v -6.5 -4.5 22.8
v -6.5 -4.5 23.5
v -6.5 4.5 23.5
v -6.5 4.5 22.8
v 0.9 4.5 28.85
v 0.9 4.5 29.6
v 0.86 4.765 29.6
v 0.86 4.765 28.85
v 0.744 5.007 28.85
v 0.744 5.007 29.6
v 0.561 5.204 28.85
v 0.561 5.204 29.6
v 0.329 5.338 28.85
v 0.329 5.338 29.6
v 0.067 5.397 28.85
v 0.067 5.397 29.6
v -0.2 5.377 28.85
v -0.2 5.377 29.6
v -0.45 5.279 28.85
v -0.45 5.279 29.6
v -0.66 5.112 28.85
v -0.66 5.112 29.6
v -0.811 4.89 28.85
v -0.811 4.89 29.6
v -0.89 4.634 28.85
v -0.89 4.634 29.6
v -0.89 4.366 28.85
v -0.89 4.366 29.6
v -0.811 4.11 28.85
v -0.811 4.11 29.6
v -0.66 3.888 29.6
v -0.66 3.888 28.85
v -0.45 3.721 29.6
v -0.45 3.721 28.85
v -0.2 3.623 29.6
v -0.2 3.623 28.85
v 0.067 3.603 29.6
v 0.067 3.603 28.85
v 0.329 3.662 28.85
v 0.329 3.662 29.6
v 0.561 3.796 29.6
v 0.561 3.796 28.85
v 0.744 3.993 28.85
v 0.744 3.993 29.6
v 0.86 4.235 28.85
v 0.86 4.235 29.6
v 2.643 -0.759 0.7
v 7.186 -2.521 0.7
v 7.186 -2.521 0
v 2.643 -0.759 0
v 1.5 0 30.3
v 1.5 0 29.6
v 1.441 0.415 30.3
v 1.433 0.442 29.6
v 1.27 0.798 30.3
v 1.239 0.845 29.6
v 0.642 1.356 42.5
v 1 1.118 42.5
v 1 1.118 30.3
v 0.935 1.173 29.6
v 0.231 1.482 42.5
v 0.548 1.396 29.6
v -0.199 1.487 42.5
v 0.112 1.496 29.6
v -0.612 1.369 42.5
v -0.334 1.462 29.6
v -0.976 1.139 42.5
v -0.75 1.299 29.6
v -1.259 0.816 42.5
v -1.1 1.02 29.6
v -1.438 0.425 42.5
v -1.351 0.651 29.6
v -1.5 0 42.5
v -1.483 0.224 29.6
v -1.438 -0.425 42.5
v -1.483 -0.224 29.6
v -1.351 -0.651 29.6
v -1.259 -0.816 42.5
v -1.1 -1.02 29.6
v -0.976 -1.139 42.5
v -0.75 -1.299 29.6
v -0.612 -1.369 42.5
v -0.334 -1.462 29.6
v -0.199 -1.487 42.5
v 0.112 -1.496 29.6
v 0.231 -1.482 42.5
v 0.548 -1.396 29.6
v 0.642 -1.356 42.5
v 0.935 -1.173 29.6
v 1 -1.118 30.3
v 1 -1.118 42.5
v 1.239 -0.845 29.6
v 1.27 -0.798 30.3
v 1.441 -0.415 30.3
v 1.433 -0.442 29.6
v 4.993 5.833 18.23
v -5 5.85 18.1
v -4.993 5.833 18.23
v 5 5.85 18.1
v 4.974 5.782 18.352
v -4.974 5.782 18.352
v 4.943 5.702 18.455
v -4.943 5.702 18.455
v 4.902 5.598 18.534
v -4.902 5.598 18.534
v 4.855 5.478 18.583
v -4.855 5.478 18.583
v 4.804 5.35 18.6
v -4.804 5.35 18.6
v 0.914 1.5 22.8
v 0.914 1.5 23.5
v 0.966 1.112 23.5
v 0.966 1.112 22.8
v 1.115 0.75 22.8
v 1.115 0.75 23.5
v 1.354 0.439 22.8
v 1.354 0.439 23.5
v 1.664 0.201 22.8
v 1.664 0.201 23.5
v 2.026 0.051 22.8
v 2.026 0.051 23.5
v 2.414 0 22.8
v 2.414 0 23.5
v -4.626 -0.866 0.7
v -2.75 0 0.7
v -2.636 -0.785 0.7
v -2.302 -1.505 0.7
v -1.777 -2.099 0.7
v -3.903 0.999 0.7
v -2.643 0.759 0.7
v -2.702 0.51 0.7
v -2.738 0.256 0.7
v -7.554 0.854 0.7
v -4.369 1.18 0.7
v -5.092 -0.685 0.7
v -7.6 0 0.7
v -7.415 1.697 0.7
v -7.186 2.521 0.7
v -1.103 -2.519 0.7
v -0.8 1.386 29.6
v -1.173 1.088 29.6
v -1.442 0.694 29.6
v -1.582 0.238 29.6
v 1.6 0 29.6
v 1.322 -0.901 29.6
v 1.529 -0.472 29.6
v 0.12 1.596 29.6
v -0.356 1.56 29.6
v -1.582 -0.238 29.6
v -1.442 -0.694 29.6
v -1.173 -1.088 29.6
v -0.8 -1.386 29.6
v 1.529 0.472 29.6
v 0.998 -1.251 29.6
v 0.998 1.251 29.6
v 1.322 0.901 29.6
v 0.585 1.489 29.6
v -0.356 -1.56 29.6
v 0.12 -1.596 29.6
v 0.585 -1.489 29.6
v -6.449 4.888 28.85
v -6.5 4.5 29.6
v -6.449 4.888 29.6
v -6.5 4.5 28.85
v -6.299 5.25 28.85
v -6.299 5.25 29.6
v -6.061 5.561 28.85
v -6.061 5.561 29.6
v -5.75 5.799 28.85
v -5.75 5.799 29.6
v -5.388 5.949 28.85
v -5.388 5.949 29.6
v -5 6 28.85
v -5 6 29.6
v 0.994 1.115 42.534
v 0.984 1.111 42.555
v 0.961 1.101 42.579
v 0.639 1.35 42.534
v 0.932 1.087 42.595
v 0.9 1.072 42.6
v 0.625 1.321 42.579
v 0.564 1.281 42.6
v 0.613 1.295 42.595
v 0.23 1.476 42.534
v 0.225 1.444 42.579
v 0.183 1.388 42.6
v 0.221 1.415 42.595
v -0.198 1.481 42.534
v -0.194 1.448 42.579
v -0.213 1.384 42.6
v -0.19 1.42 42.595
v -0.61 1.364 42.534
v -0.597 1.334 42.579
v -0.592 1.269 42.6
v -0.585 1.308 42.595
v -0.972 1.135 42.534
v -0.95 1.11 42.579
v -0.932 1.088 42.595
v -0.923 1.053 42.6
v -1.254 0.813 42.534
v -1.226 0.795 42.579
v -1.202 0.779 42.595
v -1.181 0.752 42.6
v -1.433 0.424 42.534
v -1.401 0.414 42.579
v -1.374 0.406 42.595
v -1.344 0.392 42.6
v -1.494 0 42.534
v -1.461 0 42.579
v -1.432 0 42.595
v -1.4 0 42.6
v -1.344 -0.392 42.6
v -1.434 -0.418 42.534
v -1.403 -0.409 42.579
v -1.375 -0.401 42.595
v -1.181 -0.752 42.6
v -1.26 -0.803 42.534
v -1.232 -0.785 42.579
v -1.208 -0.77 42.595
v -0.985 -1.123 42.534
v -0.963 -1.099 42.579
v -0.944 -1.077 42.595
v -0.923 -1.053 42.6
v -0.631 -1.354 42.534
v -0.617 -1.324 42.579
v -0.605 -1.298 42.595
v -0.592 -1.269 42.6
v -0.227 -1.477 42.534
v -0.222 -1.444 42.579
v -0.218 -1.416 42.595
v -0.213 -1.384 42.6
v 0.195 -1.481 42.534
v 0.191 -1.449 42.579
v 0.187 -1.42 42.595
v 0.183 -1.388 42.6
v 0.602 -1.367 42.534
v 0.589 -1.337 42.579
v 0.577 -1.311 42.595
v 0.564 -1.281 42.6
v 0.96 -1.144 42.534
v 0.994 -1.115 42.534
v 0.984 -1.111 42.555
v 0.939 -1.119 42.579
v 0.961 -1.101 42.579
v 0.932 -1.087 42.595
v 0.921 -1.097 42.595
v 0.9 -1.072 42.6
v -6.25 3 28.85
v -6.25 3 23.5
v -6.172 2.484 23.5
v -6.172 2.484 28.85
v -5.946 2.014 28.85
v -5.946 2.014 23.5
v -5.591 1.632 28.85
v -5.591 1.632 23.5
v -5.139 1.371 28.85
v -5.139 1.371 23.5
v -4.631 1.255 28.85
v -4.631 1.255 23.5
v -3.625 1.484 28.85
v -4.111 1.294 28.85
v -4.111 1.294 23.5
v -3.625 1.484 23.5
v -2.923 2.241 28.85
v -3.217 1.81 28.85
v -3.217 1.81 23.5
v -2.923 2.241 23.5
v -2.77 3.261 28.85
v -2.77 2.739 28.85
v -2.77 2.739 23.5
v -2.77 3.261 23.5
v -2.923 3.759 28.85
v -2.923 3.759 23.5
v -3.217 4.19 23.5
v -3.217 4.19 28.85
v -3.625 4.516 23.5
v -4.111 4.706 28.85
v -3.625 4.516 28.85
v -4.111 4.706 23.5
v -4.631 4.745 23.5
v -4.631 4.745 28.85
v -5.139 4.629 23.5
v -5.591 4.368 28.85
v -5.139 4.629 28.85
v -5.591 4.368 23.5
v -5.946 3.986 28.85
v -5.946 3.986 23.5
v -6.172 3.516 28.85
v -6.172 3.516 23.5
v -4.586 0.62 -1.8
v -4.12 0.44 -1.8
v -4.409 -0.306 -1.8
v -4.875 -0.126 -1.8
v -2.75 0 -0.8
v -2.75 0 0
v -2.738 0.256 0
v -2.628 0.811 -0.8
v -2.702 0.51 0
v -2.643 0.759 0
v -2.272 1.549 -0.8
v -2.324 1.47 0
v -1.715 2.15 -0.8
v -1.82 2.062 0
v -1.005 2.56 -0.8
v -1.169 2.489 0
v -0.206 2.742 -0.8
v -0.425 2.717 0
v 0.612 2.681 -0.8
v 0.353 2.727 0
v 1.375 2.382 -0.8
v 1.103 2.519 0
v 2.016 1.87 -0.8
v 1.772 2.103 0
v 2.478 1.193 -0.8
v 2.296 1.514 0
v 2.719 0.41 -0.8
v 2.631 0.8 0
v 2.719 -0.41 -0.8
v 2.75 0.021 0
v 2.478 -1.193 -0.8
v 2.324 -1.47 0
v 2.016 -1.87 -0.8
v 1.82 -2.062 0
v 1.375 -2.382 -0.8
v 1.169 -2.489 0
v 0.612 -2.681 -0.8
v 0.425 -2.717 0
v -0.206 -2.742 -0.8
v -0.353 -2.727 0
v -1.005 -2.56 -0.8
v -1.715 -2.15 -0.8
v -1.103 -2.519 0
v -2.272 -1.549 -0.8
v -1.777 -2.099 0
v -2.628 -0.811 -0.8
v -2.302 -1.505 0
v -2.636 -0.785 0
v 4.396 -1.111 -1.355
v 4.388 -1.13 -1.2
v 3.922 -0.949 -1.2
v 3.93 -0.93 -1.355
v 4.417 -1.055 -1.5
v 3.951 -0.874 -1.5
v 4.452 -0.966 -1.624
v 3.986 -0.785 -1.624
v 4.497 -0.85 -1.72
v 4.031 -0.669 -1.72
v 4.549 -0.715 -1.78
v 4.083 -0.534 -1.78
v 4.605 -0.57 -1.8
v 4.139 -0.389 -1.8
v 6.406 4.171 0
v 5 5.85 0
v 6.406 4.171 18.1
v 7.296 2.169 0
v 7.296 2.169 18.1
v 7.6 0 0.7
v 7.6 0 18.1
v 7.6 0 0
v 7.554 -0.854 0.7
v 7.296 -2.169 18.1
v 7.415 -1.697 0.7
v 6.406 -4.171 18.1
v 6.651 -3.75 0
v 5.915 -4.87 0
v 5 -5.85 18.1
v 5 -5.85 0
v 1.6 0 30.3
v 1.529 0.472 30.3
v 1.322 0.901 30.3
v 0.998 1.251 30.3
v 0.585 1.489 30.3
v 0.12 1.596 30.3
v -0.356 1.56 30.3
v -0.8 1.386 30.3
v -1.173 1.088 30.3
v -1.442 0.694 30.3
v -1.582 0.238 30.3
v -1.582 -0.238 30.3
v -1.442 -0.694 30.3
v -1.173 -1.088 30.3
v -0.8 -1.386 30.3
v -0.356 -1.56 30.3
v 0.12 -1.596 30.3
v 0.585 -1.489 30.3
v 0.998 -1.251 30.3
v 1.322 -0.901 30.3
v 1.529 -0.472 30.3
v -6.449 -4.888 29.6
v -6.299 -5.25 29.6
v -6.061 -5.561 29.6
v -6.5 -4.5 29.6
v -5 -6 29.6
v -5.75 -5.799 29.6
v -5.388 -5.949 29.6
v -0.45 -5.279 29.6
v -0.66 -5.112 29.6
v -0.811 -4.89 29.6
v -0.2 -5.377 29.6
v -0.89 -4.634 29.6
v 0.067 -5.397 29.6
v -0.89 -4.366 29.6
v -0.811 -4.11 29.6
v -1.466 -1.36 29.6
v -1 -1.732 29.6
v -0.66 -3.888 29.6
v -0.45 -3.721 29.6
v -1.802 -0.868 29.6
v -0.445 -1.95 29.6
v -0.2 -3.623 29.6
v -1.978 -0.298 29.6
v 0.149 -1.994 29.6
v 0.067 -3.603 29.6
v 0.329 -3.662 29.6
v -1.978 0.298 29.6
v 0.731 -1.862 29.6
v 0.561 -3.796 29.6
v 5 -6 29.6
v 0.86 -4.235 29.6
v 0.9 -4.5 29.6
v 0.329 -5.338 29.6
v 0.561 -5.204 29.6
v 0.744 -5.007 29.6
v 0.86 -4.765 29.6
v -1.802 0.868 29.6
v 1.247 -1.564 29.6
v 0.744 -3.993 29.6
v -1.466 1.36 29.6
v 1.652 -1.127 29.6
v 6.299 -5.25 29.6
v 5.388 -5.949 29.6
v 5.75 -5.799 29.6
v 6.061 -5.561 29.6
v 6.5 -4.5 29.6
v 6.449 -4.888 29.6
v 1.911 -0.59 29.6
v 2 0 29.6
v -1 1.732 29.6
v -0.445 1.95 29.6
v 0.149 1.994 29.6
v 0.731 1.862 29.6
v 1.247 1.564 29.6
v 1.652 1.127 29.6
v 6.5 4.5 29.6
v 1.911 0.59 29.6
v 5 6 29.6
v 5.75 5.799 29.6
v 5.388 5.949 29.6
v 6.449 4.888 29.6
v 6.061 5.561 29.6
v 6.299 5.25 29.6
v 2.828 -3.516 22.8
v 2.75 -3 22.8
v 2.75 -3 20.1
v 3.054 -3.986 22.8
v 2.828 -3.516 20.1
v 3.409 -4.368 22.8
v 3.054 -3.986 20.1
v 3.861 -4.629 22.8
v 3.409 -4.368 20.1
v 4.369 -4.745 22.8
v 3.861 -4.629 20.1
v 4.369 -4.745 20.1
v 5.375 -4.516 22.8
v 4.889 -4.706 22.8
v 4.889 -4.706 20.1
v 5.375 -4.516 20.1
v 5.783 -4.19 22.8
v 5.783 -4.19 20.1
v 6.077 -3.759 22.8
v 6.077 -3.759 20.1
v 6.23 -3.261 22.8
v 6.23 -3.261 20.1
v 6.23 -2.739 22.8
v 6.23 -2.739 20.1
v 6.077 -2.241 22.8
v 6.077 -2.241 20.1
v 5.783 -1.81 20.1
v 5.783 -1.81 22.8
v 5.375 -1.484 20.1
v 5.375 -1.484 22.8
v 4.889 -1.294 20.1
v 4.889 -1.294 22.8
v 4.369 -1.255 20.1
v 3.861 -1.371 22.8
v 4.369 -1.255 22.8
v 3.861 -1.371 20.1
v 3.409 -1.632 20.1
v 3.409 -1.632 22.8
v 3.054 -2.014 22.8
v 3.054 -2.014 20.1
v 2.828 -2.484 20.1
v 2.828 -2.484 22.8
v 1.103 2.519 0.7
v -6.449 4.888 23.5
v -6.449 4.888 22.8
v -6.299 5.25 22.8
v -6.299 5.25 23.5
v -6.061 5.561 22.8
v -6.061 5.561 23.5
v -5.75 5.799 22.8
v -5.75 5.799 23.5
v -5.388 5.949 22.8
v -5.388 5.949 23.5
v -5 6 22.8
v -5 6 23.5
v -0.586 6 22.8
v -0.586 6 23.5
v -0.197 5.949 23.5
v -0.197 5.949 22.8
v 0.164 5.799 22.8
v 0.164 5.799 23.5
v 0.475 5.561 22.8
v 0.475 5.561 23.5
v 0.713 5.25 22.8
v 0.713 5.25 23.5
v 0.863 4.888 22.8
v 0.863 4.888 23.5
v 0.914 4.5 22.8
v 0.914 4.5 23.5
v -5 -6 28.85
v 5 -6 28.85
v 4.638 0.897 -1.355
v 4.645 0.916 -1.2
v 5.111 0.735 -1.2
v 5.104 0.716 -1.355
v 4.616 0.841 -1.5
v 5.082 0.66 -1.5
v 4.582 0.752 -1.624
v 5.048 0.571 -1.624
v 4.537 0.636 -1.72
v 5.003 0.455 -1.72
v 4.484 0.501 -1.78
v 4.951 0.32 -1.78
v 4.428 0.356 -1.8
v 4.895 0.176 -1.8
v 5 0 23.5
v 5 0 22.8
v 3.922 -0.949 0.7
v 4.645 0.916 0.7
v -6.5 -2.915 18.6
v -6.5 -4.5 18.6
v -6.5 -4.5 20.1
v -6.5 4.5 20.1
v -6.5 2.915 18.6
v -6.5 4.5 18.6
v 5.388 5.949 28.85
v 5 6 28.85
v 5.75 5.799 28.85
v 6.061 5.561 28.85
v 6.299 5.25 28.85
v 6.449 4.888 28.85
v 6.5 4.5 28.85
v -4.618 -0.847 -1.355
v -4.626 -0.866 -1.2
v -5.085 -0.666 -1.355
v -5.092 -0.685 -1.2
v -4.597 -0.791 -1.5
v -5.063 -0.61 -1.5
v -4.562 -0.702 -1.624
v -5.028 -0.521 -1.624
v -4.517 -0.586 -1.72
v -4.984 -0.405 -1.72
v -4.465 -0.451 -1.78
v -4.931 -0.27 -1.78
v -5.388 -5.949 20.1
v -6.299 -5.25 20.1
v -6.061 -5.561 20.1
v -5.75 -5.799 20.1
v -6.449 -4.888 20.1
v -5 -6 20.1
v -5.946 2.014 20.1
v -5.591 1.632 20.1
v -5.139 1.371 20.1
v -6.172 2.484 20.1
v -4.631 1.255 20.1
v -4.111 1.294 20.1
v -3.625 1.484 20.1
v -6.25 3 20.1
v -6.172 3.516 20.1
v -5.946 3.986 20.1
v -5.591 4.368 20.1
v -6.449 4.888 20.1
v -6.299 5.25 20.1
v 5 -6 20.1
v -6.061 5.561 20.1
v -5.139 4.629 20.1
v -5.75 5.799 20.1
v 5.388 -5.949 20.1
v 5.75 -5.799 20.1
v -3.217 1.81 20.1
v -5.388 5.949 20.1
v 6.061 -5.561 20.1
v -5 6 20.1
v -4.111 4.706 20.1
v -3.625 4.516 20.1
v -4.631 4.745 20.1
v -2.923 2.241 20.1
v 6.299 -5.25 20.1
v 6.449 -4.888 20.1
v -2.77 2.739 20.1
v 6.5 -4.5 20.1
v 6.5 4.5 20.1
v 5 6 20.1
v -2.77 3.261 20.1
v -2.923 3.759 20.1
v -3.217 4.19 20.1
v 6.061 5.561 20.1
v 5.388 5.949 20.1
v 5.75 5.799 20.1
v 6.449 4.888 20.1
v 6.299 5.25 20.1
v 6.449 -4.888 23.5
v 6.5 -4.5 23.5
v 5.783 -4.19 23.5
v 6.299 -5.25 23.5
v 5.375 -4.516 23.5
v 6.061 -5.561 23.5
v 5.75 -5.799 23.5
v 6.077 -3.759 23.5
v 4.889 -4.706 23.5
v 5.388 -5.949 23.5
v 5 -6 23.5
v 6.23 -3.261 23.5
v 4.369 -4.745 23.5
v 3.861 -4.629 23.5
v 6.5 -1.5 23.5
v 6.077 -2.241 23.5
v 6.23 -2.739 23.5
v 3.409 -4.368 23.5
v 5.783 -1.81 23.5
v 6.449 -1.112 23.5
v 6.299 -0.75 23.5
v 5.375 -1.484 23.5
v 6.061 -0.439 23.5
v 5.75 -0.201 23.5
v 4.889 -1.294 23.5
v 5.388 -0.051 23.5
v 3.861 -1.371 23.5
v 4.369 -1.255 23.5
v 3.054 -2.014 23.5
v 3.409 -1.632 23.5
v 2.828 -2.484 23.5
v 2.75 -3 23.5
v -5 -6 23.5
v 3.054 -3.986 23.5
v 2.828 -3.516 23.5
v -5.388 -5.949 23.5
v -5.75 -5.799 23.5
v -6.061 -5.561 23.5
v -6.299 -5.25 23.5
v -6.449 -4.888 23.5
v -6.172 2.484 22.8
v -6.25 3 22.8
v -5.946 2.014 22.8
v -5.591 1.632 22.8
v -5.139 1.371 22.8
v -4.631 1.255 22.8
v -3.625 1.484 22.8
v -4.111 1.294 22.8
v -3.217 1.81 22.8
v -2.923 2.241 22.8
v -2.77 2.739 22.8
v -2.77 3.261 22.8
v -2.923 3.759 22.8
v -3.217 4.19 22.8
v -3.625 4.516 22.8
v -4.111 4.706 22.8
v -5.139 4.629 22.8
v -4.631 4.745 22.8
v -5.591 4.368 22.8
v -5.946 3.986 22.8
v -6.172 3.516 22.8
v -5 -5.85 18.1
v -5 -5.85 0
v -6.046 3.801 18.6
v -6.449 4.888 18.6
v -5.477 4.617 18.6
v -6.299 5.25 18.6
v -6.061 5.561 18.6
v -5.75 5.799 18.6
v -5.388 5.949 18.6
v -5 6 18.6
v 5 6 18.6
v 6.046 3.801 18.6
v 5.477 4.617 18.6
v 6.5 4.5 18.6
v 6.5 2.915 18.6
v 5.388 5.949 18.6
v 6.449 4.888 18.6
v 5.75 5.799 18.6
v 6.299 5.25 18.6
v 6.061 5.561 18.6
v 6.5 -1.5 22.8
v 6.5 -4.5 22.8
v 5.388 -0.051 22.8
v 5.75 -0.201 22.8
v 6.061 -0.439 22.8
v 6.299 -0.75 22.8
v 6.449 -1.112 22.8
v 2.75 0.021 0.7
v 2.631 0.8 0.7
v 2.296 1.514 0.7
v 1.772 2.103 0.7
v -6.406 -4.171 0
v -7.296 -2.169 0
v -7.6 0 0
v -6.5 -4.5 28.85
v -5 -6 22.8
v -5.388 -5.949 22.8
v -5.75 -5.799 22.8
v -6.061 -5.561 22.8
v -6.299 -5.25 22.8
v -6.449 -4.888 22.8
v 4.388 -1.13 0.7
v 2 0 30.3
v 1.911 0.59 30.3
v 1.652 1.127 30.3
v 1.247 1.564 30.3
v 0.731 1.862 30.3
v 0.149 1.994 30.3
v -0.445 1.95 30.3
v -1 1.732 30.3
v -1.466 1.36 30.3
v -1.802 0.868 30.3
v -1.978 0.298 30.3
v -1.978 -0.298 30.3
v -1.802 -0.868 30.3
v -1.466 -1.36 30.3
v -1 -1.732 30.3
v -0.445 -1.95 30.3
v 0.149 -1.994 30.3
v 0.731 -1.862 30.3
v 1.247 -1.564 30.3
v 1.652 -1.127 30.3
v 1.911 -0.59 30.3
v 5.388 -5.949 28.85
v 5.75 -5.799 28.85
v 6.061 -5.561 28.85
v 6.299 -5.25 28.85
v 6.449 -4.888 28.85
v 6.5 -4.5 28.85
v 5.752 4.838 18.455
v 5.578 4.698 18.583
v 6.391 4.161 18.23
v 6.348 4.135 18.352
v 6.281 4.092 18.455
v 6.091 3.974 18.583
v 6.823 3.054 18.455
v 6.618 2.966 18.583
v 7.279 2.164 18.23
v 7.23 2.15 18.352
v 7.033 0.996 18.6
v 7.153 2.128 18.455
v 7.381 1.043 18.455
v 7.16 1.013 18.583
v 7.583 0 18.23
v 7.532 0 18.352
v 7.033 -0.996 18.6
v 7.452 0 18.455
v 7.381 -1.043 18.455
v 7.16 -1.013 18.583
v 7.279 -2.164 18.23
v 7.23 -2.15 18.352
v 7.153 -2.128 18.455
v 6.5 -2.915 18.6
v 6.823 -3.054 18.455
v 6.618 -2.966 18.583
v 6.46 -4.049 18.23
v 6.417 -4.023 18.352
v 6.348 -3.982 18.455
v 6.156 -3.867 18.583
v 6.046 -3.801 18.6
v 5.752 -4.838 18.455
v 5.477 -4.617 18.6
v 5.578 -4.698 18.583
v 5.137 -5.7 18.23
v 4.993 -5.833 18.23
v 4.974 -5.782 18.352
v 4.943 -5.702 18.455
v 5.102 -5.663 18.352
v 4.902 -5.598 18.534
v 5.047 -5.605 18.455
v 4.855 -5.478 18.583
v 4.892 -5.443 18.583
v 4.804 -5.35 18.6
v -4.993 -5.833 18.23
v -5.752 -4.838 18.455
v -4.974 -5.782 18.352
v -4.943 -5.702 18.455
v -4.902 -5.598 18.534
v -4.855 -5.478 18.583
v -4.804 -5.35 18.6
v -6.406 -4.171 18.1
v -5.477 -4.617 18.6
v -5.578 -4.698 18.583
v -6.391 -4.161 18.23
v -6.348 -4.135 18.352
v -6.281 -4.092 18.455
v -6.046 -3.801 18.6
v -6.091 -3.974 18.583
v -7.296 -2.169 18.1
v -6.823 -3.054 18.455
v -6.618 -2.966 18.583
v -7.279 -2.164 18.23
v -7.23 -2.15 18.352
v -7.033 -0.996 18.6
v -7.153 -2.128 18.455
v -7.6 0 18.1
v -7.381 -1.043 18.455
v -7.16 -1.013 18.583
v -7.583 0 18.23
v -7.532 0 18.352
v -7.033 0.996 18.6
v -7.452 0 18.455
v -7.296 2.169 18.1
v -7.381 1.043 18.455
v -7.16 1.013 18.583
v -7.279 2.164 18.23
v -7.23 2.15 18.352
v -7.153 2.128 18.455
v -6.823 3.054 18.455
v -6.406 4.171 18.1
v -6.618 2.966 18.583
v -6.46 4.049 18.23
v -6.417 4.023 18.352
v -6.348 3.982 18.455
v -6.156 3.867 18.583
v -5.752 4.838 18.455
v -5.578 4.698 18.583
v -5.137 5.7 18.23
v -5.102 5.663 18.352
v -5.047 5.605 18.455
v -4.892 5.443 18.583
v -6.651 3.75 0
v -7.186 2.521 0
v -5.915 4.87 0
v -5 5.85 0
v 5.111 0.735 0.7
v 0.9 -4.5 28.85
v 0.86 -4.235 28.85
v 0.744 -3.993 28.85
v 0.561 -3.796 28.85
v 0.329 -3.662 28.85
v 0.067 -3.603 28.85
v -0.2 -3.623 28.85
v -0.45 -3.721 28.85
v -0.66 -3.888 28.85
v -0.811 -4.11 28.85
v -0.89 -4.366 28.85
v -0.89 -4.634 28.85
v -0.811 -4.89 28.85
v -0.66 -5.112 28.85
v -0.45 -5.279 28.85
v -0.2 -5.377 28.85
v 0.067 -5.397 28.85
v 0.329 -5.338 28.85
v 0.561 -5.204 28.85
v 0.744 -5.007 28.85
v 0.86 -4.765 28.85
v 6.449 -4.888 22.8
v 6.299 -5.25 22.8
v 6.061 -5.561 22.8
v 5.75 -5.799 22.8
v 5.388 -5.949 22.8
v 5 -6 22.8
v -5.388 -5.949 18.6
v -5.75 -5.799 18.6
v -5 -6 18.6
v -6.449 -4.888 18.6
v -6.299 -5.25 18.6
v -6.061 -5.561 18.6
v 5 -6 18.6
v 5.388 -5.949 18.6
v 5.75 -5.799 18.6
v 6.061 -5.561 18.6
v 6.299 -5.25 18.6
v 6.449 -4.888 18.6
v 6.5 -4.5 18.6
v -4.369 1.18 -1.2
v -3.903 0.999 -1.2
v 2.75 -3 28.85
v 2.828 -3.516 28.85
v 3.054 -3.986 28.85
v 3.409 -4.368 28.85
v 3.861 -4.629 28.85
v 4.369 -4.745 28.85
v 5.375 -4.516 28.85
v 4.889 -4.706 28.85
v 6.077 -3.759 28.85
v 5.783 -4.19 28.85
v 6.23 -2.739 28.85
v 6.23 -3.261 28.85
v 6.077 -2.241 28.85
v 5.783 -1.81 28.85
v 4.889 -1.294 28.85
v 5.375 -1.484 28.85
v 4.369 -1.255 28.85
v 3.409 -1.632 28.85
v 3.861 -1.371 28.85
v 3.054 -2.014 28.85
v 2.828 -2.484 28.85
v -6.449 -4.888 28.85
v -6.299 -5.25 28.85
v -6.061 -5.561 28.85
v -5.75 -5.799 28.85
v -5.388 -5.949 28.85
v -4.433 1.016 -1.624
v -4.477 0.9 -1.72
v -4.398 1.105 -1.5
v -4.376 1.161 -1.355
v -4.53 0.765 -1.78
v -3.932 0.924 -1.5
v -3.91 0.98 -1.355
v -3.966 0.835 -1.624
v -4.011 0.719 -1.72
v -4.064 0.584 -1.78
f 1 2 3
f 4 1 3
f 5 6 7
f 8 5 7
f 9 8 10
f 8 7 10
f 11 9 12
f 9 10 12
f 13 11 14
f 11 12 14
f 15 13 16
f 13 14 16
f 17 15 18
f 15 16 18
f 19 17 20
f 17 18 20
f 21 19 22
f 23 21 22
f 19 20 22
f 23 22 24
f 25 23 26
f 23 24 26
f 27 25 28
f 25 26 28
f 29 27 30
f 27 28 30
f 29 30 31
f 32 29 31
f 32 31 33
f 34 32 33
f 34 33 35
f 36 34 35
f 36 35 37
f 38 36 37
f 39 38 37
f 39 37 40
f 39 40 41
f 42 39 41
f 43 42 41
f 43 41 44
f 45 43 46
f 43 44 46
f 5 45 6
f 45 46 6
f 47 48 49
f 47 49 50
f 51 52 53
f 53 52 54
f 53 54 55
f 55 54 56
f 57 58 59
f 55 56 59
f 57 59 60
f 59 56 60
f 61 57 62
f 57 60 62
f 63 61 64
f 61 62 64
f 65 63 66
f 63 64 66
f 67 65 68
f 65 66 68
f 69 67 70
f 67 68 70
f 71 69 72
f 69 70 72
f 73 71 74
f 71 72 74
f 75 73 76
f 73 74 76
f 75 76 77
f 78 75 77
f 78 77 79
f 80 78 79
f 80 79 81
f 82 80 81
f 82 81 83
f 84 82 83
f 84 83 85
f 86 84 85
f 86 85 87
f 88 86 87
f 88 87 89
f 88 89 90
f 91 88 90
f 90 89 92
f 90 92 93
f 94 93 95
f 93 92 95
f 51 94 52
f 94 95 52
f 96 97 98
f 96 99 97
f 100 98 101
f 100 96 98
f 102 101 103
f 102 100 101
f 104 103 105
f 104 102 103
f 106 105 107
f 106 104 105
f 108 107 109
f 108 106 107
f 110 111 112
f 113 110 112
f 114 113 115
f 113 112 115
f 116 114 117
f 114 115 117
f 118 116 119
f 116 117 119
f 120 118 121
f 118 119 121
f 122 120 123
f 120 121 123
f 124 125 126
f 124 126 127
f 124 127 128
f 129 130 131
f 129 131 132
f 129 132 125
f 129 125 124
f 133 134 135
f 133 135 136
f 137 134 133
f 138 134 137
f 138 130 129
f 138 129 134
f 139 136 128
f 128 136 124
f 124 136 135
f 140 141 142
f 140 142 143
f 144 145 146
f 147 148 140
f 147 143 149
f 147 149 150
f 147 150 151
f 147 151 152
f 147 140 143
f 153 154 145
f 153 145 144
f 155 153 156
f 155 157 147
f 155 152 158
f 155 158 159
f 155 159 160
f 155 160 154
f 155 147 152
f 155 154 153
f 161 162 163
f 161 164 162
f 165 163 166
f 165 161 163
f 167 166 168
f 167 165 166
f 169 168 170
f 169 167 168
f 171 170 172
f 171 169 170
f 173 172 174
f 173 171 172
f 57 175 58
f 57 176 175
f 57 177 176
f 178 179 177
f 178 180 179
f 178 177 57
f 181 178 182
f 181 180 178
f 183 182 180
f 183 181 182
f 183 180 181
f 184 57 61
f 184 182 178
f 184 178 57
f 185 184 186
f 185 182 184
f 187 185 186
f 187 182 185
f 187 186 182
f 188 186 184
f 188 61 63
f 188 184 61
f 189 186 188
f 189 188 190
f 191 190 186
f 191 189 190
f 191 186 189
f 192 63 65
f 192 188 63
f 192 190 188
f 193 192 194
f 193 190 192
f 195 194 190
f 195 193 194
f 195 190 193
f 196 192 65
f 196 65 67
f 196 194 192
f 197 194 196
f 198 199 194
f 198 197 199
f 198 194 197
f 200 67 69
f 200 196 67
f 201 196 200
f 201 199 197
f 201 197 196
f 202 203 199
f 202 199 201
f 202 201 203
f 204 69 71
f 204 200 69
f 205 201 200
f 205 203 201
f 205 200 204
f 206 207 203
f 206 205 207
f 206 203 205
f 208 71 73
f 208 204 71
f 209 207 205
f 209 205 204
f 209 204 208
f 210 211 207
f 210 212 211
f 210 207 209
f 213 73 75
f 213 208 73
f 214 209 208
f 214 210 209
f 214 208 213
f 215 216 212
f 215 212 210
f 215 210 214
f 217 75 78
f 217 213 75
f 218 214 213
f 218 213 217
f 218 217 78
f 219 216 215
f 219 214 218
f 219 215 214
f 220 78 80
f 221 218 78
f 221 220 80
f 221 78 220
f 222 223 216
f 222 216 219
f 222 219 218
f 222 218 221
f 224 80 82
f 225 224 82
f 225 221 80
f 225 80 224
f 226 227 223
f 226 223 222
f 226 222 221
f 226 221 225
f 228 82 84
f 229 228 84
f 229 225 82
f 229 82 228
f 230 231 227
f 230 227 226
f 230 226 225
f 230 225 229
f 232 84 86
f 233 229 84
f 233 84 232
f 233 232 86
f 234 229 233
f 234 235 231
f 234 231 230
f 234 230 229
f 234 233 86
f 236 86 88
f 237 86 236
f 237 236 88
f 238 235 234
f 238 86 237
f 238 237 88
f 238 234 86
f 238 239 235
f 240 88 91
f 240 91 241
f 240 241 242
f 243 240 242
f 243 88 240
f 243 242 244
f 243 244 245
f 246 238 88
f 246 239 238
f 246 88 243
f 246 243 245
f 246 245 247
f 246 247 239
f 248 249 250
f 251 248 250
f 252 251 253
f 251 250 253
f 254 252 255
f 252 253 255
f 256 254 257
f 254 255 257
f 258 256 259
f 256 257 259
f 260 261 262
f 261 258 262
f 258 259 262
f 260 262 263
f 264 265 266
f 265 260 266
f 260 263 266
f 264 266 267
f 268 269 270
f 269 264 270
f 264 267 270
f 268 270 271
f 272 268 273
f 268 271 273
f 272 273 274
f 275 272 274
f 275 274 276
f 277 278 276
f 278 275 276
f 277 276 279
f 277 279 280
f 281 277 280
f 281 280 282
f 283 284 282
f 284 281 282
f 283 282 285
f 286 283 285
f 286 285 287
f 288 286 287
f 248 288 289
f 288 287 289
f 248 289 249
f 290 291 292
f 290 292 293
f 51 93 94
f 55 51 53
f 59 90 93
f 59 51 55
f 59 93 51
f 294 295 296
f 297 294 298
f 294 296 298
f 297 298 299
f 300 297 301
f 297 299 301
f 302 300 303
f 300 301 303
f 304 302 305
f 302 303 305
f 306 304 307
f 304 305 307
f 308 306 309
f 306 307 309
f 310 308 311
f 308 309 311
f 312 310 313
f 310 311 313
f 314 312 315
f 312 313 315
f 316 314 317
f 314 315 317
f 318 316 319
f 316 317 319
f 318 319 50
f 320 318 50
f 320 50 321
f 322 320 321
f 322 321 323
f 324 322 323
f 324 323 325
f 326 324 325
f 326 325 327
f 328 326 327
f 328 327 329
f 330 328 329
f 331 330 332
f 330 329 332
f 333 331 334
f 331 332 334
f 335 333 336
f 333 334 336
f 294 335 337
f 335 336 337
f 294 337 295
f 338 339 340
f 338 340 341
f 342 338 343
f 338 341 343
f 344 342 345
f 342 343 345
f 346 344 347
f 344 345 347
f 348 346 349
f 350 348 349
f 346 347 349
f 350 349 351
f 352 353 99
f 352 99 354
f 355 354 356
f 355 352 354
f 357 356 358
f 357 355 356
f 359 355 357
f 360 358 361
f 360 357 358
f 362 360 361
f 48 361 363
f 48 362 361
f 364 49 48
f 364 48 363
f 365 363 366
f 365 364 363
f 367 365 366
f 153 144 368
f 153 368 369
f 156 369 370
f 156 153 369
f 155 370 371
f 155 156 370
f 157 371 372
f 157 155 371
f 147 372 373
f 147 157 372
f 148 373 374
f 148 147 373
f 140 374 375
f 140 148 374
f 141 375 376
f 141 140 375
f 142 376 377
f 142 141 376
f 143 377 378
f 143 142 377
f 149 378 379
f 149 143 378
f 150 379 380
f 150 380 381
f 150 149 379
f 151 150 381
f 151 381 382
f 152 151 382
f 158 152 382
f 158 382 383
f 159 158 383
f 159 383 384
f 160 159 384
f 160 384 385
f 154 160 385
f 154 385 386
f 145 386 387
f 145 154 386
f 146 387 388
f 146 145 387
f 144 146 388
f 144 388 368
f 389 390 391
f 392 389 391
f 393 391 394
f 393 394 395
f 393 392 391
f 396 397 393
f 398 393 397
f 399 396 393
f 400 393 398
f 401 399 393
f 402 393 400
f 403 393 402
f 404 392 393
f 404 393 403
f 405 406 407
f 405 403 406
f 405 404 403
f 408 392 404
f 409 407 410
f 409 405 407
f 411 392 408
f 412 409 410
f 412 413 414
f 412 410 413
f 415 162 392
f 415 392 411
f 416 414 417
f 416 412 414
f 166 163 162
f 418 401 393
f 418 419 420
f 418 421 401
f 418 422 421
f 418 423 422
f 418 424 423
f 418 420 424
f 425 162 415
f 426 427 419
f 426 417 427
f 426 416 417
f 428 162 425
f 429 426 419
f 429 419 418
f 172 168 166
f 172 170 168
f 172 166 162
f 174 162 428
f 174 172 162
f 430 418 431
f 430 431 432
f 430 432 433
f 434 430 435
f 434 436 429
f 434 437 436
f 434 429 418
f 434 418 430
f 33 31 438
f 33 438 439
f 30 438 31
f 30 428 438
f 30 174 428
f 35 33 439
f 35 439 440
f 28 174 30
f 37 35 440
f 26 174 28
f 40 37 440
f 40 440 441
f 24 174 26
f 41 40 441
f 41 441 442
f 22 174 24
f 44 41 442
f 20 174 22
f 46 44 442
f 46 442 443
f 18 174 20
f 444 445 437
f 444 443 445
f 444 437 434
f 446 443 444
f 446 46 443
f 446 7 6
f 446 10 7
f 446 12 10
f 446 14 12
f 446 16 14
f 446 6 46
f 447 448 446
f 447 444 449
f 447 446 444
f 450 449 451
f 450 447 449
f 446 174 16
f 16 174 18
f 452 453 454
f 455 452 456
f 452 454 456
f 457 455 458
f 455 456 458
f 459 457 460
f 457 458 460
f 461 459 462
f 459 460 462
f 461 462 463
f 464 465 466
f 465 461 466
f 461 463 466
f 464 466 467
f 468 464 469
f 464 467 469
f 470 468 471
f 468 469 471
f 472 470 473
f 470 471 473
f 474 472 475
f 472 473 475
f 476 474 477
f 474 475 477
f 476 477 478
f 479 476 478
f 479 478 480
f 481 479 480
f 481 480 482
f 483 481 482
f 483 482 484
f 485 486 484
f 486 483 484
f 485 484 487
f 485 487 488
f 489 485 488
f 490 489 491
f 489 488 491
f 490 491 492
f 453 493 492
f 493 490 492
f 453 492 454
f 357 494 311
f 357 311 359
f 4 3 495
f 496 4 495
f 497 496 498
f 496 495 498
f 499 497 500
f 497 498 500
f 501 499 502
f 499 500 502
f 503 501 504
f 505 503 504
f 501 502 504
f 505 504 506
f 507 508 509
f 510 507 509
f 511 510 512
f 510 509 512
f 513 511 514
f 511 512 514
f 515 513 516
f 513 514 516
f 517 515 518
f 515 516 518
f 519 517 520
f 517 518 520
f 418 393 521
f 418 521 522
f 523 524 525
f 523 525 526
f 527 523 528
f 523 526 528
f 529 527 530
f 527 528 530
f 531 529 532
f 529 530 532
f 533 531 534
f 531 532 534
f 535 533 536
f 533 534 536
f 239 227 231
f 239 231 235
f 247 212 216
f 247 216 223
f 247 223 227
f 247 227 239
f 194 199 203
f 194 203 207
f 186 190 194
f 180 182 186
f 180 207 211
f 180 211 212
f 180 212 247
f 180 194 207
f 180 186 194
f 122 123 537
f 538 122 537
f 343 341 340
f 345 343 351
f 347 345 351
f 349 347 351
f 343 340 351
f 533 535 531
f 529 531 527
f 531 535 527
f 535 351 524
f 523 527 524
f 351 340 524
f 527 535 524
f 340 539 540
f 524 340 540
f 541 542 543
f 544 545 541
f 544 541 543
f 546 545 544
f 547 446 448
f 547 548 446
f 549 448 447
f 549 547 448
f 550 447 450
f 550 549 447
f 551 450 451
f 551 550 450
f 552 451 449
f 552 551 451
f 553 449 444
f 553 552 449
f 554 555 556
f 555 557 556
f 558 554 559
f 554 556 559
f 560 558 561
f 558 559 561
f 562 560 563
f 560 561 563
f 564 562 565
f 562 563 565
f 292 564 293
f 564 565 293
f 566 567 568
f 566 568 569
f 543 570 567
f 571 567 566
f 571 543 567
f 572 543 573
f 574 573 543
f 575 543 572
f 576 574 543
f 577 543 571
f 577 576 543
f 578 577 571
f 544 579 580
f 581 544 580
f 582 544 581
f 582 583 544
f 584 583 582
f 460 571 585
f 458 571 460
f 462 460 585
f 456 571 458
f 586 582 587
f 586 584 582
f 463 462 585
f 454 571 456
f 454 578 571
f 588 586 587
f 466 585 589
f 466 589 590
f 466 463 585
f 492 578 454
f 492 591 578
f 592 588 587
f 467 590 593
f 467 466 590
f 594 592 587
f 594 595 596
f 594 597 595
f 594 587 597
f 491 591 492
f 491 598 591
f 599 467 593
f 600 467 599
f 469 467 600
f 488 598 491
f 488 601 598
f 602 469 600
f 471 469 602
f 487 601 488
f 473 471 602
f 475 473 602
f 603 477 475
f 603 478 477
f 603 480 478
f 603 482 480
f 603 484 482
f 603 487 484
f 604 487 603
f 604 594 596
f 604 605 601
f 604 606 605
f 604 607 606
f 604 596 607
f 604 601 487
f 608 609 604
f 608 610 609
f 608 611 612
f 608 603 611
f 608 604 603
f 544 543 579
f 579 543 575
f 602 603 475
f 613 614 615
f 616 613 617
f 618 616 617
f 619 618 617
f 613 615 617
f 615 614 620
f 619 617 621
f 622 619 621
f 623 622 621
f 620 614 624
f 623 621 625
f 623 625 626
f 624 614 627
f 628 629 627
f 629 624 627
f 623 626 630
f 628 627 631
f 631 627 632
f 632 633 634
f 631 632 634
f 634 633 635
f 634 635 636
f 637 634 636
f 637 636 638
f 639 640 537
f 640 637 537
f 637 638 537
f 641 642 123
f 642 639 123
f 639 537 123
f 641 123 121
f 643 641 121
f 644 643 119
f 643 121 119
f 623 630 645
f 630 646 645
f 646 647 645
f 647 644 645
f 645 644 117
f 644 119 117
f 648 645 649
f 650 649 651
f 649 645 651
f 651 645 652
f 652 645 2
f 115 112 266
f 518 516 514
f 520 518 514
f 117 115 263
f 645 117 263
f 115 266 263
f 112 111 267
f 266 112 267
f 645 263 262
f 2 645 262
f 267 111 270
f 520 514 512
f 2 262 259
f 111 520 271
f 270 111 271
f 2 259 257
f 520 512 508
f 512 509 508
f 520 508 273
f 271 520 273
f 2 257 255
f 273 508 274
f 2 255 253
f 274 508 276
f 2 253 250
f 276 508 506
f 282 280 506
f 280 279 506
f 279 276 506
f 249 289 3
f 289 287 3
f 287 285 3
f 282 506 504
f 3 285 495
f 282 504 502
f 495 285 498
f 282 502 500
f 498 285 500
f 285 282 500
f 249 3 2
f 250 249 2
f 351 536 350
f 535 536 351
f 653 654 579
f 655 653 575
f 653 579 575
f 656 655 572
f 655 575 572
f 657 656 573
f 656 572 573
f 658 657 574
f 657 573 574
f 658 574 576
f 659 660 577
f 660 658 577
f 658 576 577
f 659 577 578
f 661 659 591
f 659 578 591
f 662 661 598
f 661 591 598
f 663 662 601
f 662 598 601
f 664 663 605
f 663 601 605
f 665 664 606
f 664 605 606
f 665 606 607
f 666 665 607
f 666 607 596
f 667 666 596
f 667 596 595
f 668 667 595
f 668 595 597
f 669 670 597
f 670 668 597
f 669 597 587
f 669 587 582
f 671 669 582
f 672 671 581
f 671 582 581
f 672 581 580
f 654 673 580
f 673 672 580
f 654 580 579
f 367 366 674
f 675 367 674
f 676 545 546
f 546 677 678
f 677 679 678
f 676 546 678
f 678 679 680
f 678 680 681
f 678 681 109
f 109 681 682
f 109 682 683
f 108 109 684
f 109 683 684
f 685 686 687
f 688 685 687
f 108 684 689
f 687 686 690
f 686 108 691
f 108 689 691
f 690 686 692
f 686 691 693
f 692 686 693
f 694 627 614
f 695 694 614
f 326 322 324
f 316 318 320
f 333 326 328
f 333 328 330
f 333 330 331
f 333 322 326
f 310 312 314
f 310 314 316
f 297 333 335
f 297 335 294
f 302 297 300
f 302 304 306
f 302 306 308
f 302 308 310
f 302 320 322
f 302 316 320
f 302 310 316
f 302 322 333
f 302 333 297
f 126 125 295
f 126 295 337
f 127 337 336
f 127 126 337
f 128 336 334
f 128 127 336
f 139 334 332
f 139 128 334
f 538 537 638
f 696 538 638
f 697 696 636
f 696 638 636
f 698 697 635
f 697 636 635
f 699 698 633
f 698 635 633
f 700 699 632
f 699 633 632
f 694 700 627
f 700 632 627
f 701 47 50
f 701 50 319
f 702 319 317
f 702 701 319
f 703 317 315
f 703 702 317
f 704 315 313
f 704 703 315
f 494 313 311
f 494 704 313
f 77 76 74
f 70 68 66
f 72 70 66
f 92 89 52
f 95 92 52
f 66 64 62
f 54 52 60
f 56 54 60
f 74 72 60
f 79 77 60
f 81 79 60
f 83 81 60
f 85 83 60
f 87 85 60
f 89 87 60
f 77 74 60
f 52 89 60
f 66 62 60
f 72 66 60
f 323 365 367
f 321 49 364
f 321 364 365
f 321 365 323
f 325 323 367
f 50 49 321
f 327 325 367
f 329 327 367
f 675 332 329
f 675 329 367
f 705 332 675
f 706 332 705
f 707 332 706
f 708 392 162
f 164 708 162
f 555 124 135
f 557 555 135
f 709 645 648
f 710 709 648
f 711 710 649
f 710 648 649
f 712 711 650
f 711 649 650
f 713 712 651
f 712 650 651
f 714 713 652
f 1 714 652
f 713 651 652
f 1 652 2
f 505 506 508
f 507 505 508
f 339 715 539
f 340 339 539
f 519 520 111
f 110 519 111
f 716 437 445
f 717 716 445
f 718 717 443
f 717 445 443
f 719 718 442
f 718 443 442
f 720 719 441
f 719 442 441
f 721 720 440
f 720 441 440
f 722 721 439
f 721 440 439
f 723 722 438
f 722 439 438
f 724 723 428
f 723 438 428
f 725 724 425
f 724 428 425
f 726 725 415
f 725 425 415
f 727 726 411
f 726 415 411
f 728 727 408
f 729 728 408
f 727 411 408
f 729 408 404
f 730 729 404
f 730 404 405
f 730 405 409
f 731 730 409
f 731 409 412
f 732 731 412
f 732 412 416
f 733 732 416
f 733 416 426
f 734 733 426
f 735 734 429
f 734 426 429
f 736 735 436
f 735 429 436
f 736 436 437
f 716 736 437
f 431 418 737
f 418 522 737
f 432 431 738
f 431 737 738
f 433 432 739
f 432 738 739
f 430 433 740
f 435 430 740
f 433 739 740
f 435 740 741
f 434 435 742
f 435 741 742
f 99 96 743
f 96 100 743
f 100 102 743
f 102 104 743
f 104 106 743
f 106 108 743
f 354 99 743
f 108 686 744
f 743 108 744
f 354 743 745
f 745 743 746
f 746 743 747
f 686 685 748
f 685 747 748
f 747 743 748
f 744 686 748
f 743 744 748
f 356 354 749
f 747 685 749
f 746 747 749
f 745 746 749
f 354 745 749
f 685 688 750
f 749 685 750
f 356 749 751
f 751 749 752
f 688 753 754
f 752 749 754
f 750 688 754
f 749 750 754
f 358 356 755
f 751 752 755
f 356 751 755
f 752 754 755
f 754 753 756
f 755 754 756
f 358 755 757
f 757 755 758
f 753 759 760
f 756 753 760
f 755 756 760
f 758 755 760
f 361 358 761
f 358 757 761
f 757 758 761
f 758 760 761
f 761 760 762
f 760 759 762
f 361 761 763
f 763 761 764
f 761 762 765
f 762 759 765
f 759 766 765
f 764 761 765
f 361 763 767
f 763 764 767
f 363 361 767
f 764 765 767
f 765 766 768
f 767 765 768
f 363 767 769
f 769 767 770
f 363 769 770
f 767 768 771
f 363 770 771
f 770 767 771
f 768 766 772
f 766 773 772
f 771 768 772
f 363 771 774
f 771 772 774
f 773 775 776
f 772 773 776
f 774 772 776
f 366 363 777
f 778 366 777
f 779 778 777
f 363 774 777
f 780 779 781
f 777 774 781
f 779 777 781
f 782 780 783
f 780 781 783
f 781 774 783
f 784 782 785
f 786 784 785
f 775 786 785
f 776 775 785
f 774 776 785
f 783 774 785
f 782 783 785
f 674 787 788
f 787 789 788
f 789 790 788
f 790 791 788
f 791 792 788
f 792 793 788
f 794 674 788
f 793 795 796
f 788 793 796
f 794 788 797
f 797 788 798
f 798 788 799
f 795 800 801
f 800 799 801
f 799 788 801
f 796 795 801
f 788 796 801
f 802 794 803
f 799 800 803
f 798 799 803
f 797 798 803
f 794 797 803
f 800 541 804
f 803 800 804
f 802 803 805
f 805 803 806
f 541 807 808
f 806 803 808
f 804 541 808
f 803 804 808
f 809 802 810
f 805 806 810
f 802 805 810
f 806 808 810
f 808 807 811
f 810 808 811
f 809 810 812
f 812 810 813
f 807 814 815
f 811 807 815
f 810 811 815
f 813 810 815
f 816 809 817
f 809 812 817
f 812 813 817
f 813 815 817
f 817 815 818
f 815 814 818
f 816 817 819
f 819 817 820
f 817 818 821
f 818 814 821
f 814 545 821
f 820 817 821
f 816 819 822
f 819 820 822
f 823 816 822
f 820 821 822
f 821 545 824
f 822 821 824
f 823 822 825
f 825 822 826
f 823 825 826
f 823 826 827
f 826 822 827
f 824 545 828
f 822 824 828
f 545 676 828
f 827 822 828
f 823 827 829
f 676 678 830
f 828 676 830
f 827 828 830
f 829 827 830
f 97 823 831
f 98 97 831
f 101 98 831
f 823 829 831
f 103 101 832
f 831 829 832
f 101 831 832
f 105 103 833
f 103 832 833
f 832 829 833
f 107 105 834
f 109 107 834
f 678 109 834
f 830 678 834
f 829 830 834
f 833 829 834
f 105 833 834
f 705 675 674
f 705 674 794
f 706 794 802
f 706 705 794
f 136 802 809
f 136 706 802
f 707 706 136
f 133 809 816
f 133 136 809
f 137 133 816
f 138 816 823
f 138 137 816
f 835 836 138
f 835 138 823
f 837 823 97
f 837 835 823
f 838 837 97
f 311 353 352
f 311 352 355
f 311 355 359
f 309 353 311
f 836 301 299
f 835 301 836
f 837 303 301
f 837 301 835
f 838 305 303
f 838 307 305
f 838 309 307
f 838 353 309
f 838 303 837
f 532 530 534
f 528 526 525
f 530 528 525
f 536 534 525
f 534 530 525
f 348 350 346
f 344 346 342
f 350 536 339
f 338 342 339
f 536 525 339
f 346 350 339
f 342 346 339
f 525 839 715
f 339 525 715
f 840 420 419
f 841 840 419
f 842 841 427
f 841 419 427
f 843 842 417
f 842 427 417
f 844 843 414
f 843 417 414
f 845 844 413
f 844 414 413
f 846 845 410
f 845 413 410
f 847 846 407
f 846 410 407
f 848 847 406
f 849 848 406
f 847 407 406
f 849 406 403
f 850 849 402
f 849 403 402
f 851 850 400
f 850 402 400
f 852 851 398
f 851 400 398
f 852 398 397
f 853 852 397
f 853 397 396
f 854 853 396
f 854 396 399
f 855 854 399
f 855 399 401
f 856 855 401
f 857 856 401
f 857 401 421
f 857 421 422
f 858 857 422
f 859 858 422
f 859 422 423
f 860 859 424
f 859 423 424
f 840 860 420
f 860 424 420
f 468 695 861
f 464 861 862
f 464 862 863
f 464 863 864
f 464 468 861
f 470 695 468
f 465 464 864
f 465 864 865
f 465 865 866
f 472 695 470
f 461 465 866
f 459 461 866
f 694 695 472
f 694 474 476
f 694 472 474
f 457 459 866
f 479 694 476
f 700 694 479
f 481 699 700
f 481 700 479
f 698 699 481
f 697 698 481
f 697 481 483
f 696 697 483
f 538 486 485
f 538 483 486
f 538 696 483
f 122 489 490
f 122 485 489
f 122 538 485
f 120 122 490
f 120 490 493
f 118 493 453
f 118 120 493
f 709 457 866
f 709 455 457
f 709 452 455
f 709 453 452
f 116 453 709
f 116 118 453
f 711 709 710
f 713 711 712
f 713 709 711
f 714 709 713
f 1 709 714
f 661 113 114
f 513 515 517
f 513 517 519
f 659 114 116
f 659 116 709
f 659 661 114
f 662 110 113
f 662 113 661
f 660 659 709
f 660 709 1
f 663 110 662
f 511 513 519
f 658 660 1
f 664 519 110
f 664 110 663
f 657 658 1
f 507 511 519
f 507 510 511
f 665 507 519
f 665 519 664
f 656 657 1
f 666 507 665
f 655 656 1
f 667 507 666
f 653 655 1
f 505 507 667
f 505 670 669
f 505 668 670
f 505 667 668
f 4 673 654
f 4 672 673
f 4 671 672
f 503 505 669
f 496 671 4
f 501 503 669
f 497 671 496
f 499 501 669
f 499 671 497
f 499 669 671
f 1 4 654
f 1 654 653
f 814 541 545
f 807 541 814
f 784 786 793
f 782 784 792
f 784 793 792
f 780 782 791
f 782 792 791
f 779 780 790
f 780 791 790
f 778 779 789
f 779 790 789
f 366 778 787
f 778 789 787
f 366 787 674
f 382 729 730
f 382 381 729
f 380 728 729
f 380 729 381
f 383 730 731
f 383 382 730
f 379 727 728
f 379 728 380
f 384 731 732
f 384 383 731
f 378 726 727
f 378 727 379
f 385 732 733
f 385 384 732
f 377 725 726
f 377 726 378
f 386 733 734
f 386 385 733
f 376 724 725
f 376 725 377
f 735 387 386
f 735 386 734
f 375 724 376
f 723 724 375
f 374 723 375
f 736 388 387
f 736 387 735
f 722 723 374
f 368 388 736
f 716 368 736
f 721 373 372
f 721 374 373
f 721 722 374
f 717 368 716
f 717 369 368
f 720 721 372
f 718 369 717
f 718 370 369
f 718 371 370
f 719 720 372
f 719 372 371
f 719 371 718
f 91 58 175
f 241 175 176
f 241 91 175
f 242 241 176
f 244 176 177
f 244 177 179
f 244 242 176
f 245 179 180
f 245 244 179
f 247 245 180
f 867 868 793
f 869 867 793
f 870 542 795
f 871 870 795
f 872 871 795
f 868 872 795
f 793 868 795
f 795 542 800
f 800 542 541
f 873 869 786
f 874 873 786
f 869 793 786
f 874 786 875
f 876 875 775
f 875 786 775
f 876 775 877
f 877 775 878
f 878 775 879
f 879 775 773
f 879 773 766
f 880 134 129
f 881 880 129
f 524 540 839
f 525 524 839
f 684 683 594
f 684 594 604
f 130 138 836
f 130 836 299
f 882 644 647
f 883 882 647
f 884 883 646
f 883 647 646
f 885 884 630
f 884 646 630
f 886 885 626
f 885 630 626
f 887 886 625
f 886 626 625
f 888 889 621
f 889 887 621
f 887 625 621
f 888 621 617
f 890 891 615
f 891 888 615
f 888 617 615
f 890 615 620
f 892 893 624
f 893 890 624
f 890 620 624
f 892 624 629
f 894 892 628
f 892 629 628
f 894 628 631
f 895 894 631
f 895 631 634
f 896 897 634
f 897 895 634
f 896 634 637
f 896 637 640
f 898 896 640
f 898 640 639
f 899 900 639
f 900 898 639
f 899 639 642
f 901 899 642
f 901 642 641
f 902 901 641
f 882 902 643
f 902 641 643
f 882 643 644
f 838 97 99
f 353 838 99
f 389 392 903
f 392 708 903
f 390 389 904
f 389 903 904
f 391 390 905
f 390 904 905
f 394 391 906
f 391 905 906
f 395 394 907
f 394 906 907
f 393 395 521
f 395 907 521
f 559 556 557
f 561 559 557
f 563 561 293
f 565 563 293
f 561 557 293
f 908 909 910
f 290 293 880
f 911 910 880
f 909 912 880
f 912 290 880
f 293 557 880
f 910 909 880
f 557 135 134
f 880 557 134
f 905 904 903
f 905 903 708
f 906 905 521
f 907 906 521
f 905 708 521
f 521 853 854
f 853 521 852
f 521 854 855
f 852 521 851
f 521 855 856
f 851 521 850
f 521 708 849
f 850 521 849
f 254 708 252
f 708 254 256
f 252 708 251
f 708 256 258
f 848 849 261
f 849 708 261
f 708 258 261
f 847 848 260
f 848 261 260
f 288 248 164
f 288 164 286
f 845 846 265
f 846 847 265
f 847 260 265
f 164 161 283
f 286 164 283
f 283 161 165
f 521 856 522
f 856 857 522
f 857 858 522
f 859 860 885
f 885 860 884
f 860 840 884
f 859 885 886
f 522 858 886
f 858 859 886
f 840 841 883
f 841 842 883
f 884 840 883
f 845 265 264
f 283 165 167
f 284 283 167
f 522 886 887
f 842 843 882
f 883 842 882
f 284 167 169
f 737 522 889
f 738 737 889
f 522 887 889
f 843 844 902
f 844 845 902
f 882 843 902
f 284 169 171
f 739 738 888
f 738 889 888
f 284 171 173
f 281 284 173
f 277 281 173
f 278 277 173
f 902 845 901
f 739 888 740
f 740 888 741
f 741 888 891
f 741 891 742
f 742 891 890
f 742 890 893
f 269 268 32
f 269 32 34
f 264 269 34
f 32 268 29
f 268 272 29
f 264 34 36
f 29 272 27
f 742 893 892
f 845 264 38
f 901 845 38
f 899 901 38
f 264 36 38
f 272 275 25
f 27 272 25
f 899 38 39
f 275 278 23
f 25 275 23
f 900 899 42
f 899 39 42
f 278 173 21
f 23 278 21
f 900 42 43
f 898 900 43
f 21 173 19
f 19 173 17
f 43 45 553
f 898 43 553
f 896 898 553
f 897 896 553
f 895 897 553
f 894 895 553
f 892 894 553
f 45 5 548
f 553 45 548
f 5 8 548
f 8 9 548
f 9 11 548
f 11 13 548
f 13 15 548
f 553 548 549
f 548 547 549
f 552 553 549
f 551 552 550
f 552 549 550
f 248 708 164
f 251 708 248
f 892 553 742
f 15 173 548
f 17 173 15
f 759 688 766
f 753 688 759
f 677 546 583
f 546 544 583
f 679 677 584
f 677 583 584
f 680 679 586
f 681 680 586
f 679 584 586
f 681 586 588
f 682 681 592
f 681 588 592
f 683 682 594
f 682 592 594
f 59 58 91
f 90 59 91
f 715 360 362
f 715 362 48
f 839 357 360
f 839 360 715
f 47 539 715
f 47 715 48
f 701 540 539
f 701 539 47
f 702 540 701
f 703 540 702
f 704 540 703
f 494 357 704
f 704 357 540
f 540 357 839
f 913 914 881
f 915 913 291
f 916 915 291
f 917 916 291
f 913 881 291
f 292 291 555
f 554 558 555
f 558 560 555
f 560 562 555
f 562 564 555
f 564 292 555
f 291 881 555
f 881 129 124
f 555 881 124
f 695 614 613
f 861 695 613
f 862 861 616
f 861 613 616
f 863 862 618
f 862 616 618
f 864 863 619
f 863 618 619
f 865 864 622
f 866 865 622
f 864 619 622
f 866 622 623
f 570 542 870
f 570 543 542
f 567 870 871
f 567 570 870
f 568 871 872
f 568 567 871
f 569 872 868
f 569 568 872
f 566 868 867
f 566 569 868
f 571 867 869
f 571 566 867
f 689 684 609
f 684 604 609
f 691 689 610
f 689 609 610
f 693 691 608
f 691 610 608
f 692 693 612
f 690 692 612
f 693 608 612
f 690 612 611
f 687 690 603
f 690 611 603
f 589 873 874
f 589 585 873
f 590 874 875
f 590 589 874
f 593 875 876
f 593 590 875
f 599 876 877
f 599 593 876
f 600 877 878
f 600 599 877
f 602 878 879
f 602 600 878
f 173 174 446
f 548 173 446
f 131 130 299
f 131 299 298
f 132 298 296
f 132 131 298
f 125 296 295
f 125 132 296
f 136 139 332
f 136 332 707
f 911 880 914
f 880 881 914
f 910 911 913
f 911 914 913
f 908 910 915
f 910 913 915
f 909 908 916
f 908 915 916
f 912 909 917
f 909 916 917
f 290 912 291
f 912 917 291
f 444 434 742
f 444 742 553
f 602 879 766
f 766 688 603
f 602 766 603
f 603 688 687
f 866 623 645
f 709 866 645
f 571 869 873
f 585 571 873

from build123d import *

# Parameters (mm, degrees)
MOTOR_DEPTH            = 18.6
SKETCH2_R              = 2.75
BOSS_EXTRUDE2_DEPTH    = 0.8
FILLET1_R              = 0.5
SKETCH3_W              = 13
SKETCH3_H              = 12
REDUCTOR_BASE_DEPTH    = 1.5
SKETCH4_R              = 1.75
REDUCTOR_SUPPORT_DEPTH = 9.5
SKETCH5_W              = 13
SKETCH5_H              = 12
REDUCTOR_CEIL_DEPTH    = 0.75
FILLET2_R              = 1.5
SKETCH6_R              = 2
SKETCH6_R_2            = 1.6
SHAFT_RING_DEPTH       = 0.7
SKETCH7_R              = 1.5
SHAFT_DEPTH            = 13
SHAFT_D_TRIM_DEPTH     = 12.3
SKETCH9_R              = 0.9
MOUNT_HOLE_DEPTH       = 0.75
CUT_EXTRUDE8_START     = -0.7
CUT_EXTRUDE8_DEPTH     = 0.7
PINS_DEPTH             = 2.5
FILLET4_R              = 0.6
FILLET5_R              = 0.1
BOSS_EXTRUDE11_DEPTH   = 0.7


with BuildPart() as part:
    # Sketch1 → Motor (new body)
    with BuildSketch(Plane.XY):
        with BuildLine():
            Line((-5, 5.85), (5, 5.85))
            ThreePointArc((5, 5.85), (7.6, 0), (5, -5.85))
            Line((5, -5.85), (-5, -5.85))
            ThreePointArc((-5, -5.85), (-7.6, 0), (-5, 5.85))
        make_face()
    extrude(amount=MOTOR_DEPTH)

    # Sketch2 → Boss-Extrude2 (add)
    with BuildSketch(Plane(origin=(0, 0, 0), x_dir=(-1, 0, 0), z_dir=(0, 0, -1))):
        Circle(SKETCH2_R)
    extrude(amount=BOSS_EXTRUDE2_DEPTH)

    # Fillet1
    fillet1_edges = [part.edges().sort_by_distance(p)[0] for p in [
        (7.6, 0, 18.6),
        (0, 5.85, 18.6),
        (-7.6, 0, 18.6),
        (0, -5.85, 18.6),
    ]]
    fillet(fillet1_edges, radius=FILLET1_R)

    # Sketch3 → reductor_base (add)
    with BuildSketch(Plane.XY.offset(18.6)):
        Rectangle(SKETCH3_W, SKETCH3_H)
    extrude(amount=REDUCTOR_BASE_DEPTH)

    # Sketch4 → reductor_support (add)
    with BuildSketch(Plane.XY.offset(20.1)):
        with Locations(Location((-4.5, 3, 0), (0, 0, 180))):
            Circle(SKETCH4_R)
        with Locations(Location((4.5, -3, 0), (0, 0, 180))):
            Circle(SKETCH4_R)
    extrude(amount=REDUCTOR_SUPPORT_DEPTH)

    # Sketch5 → reductor_ceil (add)
    with BuildSketch(Plane.XY.offset(29.6)):
        Rectangle(SKETCH5_W, SKETCH5_H)
    extrude(amount=-REDUCTOR_CEIL_DEPTH)

    # Fillet2
    fillet2_edges = [part.edges().sort_by_distance(p)[0] for p in [
        (6.5, -6, 19.35),
        (6.5, 6, 19.35),
        (-6.5, 6, 19.35),
        (-6.5, -6, 19.35),
        (-6.5, -6, 29.225),
        (-6.5, 6, 29.225),
        (6.5, 6, 29.225),
        (6.5, -6, 29.225),
    ]]
    fillet(fillet2_edges, radius=FILLET2_R)

    # Sketch6 → shaft_ring (add)
    with BuildSketch(Plane.XY.offset(29.6)):
        Circle(SKETCH6_R)
        Circle(SKETCH6_R_2, mode=Mode.SUBTRACT)
    extrude(amount=SHAFT_RING_DEPTH)

    # Sketch9 → mount_hole (cut)
    with BuildSketch(Plane.XY.offset(29.6)):
        with Locations((0, 4.5)):
            Circle(SKETCH9_R)
        with Locations((0, -4.5)):
            Circle(SKETCH9_R)
    extrude(amount=-MOUNT_HOLE_DEPTH, mode=Mode.SUBTRACT)

    # Sketch12 → Cut-Extrude8 (cut)
    with BuildSketch(Plane(origin=(0, 0, 0), x_dir=(-1, 0, 0), z_dir=(0, 0, -1)).offset(CUT_EXTRUDE8_START)):
        with BuildLine():
            ThreePointArc((-2.643071494, -0.759389938), (-2.489152604, 1.169024943), (-1.103419984, 2.518921266))
            Line((-1.103419984, 2.518921265), (-7.6, 0))
            ThreePointArc((-7.6, 0), (-7.495807414, -1.277293839), (-7.185984571, -2.520815231))
            Line((-7.185984571, -2.520815231), (-2.643071494, -0.759389938))
        make_face()
        with BuildLine():
            ThreePointArc((7.6, 0), (7.495807414, 1.277293839), (7.185984571, 2.520815231))
            Line((7.185984571, 2.520815231), (2.643071494, 0.759389938))
            ThreePointArc((2.643071494, 0.759389938), (2.723136667, 0.383440603), (2.75, 0))
            ThreePointArc((2.75, 0), (2.301836762, -1.504675222), (1.103419984, -2.518921266))
            Line((1.103419984, -2.518921265), (7.6, 0))
        make_face()
    extrude(amount=CUT_EXTRUDE8_DEPTH, mode=Mode.SUBTRACT)

    # Sketch13 → pins (add)
    with BuildSketch(Plane(origin=(0, 0, 0.7), x_dir=(-1, 0, 0), z_dir=(0, 0, -1))):
        Polygon((3.902789088, 0.999038213), (4.625804679, -0.86569996), (5.091989223, -0.684946062), (4.368973632, 1.179792111), align=None)
        Polygon((-5.111425378, 0.735074083), (-4.388409787, -1.12966409), (-3.922225244, -0.948910192), (-4.645240835, 0.915827981), align=None)
    extrude(amount=PINS_DEPTH)

    # Fillet4
    fillet4_edges = [part.edges().sort_by_distance(p)[0] for p in [
        (-4.13588136, 1.089415162, -1.8),
        (-4.858896951, -0.775323011, -1.8),
        (4.878333106, 0.825451032, -1.8),
        (4.155317515, -1.039287141, -1.8),
    ]]
    fillet(fillet4_edges, radius=FILLET4_R)

    # Sketch15 → Boss-Extrude11 (add)
    with BuildSketch(Plane.XY.offset(23.5)):
        with BuildLine():
            Line((0.914441288, 4.5), (0.914441288, 1.5))
            ThreePointArc((0.914441288, 1.5), (1.353781117, 0.439339828), (2.414441288, 0))
            Line((2.414441288, 0), (5, 0))
            ThreePointArc((5, 0), (6.060660172, -0.439339828), (6.5, -1.5))
            Line((6.5, -1.5), (6.5, -4.5))
            ThreePointArc((6.5, -4.5), (6.060660172, -5.560660172), (5, -6))
            Line((5, -6), (-5, -6))
            ThreePointArc((-5, -6), (-6.060660172, -5.560660172), (-6.5, -4.5))
            Line((-6.5, -4.5), (-6.5, 4.5))
            ThreePointArc((-6.5, 4.5), (-6.060660172, 5.560660172), (-5, 6))
            Line((-5, 6), (-0.585558712, 6))
            ThreePointArc((-0.585558712, 6), (0.47510146, 5.560660172), (0.914441288, 4.5))
        make_face()
    extrude(amount=-BOSS_EXTRUDE11_DEPTH)


with BuildPart() as body_2:
    # Sketch7 → shaft (new body)
    with BuildSketch(Plane.XY.offset(29.6)):
        Circle(SKETCH7_R)
    extrude(amount=SHAFT_DEPTH)

    # Sketch8 → shaft_D_trim (cut)
    with BuildSketch(Plane.XY.offset(42.6)):
        with BuildLine():
            Line((1, 1.118033989), (1, -1.118033989))
            ThreePointArc((1, -1.118033989), (1.5, 0), (1, 1.118033989))
        make_face()
    extrude(amount=-SHAFT_D_TRIM_DEPTH, mode=Mode.SUBTRACT)

    # Fillet5
    fillet5_edges = [body_2.edges().sort_by_distance(p)[0] for p in [
        (-1.5, 0, 42.6),
        (1, 0, 42.6),
    ]]
    fillet(fillet5_edges, radius=FILLET5_R)


solid = Compound([part.part, body_2.part])
